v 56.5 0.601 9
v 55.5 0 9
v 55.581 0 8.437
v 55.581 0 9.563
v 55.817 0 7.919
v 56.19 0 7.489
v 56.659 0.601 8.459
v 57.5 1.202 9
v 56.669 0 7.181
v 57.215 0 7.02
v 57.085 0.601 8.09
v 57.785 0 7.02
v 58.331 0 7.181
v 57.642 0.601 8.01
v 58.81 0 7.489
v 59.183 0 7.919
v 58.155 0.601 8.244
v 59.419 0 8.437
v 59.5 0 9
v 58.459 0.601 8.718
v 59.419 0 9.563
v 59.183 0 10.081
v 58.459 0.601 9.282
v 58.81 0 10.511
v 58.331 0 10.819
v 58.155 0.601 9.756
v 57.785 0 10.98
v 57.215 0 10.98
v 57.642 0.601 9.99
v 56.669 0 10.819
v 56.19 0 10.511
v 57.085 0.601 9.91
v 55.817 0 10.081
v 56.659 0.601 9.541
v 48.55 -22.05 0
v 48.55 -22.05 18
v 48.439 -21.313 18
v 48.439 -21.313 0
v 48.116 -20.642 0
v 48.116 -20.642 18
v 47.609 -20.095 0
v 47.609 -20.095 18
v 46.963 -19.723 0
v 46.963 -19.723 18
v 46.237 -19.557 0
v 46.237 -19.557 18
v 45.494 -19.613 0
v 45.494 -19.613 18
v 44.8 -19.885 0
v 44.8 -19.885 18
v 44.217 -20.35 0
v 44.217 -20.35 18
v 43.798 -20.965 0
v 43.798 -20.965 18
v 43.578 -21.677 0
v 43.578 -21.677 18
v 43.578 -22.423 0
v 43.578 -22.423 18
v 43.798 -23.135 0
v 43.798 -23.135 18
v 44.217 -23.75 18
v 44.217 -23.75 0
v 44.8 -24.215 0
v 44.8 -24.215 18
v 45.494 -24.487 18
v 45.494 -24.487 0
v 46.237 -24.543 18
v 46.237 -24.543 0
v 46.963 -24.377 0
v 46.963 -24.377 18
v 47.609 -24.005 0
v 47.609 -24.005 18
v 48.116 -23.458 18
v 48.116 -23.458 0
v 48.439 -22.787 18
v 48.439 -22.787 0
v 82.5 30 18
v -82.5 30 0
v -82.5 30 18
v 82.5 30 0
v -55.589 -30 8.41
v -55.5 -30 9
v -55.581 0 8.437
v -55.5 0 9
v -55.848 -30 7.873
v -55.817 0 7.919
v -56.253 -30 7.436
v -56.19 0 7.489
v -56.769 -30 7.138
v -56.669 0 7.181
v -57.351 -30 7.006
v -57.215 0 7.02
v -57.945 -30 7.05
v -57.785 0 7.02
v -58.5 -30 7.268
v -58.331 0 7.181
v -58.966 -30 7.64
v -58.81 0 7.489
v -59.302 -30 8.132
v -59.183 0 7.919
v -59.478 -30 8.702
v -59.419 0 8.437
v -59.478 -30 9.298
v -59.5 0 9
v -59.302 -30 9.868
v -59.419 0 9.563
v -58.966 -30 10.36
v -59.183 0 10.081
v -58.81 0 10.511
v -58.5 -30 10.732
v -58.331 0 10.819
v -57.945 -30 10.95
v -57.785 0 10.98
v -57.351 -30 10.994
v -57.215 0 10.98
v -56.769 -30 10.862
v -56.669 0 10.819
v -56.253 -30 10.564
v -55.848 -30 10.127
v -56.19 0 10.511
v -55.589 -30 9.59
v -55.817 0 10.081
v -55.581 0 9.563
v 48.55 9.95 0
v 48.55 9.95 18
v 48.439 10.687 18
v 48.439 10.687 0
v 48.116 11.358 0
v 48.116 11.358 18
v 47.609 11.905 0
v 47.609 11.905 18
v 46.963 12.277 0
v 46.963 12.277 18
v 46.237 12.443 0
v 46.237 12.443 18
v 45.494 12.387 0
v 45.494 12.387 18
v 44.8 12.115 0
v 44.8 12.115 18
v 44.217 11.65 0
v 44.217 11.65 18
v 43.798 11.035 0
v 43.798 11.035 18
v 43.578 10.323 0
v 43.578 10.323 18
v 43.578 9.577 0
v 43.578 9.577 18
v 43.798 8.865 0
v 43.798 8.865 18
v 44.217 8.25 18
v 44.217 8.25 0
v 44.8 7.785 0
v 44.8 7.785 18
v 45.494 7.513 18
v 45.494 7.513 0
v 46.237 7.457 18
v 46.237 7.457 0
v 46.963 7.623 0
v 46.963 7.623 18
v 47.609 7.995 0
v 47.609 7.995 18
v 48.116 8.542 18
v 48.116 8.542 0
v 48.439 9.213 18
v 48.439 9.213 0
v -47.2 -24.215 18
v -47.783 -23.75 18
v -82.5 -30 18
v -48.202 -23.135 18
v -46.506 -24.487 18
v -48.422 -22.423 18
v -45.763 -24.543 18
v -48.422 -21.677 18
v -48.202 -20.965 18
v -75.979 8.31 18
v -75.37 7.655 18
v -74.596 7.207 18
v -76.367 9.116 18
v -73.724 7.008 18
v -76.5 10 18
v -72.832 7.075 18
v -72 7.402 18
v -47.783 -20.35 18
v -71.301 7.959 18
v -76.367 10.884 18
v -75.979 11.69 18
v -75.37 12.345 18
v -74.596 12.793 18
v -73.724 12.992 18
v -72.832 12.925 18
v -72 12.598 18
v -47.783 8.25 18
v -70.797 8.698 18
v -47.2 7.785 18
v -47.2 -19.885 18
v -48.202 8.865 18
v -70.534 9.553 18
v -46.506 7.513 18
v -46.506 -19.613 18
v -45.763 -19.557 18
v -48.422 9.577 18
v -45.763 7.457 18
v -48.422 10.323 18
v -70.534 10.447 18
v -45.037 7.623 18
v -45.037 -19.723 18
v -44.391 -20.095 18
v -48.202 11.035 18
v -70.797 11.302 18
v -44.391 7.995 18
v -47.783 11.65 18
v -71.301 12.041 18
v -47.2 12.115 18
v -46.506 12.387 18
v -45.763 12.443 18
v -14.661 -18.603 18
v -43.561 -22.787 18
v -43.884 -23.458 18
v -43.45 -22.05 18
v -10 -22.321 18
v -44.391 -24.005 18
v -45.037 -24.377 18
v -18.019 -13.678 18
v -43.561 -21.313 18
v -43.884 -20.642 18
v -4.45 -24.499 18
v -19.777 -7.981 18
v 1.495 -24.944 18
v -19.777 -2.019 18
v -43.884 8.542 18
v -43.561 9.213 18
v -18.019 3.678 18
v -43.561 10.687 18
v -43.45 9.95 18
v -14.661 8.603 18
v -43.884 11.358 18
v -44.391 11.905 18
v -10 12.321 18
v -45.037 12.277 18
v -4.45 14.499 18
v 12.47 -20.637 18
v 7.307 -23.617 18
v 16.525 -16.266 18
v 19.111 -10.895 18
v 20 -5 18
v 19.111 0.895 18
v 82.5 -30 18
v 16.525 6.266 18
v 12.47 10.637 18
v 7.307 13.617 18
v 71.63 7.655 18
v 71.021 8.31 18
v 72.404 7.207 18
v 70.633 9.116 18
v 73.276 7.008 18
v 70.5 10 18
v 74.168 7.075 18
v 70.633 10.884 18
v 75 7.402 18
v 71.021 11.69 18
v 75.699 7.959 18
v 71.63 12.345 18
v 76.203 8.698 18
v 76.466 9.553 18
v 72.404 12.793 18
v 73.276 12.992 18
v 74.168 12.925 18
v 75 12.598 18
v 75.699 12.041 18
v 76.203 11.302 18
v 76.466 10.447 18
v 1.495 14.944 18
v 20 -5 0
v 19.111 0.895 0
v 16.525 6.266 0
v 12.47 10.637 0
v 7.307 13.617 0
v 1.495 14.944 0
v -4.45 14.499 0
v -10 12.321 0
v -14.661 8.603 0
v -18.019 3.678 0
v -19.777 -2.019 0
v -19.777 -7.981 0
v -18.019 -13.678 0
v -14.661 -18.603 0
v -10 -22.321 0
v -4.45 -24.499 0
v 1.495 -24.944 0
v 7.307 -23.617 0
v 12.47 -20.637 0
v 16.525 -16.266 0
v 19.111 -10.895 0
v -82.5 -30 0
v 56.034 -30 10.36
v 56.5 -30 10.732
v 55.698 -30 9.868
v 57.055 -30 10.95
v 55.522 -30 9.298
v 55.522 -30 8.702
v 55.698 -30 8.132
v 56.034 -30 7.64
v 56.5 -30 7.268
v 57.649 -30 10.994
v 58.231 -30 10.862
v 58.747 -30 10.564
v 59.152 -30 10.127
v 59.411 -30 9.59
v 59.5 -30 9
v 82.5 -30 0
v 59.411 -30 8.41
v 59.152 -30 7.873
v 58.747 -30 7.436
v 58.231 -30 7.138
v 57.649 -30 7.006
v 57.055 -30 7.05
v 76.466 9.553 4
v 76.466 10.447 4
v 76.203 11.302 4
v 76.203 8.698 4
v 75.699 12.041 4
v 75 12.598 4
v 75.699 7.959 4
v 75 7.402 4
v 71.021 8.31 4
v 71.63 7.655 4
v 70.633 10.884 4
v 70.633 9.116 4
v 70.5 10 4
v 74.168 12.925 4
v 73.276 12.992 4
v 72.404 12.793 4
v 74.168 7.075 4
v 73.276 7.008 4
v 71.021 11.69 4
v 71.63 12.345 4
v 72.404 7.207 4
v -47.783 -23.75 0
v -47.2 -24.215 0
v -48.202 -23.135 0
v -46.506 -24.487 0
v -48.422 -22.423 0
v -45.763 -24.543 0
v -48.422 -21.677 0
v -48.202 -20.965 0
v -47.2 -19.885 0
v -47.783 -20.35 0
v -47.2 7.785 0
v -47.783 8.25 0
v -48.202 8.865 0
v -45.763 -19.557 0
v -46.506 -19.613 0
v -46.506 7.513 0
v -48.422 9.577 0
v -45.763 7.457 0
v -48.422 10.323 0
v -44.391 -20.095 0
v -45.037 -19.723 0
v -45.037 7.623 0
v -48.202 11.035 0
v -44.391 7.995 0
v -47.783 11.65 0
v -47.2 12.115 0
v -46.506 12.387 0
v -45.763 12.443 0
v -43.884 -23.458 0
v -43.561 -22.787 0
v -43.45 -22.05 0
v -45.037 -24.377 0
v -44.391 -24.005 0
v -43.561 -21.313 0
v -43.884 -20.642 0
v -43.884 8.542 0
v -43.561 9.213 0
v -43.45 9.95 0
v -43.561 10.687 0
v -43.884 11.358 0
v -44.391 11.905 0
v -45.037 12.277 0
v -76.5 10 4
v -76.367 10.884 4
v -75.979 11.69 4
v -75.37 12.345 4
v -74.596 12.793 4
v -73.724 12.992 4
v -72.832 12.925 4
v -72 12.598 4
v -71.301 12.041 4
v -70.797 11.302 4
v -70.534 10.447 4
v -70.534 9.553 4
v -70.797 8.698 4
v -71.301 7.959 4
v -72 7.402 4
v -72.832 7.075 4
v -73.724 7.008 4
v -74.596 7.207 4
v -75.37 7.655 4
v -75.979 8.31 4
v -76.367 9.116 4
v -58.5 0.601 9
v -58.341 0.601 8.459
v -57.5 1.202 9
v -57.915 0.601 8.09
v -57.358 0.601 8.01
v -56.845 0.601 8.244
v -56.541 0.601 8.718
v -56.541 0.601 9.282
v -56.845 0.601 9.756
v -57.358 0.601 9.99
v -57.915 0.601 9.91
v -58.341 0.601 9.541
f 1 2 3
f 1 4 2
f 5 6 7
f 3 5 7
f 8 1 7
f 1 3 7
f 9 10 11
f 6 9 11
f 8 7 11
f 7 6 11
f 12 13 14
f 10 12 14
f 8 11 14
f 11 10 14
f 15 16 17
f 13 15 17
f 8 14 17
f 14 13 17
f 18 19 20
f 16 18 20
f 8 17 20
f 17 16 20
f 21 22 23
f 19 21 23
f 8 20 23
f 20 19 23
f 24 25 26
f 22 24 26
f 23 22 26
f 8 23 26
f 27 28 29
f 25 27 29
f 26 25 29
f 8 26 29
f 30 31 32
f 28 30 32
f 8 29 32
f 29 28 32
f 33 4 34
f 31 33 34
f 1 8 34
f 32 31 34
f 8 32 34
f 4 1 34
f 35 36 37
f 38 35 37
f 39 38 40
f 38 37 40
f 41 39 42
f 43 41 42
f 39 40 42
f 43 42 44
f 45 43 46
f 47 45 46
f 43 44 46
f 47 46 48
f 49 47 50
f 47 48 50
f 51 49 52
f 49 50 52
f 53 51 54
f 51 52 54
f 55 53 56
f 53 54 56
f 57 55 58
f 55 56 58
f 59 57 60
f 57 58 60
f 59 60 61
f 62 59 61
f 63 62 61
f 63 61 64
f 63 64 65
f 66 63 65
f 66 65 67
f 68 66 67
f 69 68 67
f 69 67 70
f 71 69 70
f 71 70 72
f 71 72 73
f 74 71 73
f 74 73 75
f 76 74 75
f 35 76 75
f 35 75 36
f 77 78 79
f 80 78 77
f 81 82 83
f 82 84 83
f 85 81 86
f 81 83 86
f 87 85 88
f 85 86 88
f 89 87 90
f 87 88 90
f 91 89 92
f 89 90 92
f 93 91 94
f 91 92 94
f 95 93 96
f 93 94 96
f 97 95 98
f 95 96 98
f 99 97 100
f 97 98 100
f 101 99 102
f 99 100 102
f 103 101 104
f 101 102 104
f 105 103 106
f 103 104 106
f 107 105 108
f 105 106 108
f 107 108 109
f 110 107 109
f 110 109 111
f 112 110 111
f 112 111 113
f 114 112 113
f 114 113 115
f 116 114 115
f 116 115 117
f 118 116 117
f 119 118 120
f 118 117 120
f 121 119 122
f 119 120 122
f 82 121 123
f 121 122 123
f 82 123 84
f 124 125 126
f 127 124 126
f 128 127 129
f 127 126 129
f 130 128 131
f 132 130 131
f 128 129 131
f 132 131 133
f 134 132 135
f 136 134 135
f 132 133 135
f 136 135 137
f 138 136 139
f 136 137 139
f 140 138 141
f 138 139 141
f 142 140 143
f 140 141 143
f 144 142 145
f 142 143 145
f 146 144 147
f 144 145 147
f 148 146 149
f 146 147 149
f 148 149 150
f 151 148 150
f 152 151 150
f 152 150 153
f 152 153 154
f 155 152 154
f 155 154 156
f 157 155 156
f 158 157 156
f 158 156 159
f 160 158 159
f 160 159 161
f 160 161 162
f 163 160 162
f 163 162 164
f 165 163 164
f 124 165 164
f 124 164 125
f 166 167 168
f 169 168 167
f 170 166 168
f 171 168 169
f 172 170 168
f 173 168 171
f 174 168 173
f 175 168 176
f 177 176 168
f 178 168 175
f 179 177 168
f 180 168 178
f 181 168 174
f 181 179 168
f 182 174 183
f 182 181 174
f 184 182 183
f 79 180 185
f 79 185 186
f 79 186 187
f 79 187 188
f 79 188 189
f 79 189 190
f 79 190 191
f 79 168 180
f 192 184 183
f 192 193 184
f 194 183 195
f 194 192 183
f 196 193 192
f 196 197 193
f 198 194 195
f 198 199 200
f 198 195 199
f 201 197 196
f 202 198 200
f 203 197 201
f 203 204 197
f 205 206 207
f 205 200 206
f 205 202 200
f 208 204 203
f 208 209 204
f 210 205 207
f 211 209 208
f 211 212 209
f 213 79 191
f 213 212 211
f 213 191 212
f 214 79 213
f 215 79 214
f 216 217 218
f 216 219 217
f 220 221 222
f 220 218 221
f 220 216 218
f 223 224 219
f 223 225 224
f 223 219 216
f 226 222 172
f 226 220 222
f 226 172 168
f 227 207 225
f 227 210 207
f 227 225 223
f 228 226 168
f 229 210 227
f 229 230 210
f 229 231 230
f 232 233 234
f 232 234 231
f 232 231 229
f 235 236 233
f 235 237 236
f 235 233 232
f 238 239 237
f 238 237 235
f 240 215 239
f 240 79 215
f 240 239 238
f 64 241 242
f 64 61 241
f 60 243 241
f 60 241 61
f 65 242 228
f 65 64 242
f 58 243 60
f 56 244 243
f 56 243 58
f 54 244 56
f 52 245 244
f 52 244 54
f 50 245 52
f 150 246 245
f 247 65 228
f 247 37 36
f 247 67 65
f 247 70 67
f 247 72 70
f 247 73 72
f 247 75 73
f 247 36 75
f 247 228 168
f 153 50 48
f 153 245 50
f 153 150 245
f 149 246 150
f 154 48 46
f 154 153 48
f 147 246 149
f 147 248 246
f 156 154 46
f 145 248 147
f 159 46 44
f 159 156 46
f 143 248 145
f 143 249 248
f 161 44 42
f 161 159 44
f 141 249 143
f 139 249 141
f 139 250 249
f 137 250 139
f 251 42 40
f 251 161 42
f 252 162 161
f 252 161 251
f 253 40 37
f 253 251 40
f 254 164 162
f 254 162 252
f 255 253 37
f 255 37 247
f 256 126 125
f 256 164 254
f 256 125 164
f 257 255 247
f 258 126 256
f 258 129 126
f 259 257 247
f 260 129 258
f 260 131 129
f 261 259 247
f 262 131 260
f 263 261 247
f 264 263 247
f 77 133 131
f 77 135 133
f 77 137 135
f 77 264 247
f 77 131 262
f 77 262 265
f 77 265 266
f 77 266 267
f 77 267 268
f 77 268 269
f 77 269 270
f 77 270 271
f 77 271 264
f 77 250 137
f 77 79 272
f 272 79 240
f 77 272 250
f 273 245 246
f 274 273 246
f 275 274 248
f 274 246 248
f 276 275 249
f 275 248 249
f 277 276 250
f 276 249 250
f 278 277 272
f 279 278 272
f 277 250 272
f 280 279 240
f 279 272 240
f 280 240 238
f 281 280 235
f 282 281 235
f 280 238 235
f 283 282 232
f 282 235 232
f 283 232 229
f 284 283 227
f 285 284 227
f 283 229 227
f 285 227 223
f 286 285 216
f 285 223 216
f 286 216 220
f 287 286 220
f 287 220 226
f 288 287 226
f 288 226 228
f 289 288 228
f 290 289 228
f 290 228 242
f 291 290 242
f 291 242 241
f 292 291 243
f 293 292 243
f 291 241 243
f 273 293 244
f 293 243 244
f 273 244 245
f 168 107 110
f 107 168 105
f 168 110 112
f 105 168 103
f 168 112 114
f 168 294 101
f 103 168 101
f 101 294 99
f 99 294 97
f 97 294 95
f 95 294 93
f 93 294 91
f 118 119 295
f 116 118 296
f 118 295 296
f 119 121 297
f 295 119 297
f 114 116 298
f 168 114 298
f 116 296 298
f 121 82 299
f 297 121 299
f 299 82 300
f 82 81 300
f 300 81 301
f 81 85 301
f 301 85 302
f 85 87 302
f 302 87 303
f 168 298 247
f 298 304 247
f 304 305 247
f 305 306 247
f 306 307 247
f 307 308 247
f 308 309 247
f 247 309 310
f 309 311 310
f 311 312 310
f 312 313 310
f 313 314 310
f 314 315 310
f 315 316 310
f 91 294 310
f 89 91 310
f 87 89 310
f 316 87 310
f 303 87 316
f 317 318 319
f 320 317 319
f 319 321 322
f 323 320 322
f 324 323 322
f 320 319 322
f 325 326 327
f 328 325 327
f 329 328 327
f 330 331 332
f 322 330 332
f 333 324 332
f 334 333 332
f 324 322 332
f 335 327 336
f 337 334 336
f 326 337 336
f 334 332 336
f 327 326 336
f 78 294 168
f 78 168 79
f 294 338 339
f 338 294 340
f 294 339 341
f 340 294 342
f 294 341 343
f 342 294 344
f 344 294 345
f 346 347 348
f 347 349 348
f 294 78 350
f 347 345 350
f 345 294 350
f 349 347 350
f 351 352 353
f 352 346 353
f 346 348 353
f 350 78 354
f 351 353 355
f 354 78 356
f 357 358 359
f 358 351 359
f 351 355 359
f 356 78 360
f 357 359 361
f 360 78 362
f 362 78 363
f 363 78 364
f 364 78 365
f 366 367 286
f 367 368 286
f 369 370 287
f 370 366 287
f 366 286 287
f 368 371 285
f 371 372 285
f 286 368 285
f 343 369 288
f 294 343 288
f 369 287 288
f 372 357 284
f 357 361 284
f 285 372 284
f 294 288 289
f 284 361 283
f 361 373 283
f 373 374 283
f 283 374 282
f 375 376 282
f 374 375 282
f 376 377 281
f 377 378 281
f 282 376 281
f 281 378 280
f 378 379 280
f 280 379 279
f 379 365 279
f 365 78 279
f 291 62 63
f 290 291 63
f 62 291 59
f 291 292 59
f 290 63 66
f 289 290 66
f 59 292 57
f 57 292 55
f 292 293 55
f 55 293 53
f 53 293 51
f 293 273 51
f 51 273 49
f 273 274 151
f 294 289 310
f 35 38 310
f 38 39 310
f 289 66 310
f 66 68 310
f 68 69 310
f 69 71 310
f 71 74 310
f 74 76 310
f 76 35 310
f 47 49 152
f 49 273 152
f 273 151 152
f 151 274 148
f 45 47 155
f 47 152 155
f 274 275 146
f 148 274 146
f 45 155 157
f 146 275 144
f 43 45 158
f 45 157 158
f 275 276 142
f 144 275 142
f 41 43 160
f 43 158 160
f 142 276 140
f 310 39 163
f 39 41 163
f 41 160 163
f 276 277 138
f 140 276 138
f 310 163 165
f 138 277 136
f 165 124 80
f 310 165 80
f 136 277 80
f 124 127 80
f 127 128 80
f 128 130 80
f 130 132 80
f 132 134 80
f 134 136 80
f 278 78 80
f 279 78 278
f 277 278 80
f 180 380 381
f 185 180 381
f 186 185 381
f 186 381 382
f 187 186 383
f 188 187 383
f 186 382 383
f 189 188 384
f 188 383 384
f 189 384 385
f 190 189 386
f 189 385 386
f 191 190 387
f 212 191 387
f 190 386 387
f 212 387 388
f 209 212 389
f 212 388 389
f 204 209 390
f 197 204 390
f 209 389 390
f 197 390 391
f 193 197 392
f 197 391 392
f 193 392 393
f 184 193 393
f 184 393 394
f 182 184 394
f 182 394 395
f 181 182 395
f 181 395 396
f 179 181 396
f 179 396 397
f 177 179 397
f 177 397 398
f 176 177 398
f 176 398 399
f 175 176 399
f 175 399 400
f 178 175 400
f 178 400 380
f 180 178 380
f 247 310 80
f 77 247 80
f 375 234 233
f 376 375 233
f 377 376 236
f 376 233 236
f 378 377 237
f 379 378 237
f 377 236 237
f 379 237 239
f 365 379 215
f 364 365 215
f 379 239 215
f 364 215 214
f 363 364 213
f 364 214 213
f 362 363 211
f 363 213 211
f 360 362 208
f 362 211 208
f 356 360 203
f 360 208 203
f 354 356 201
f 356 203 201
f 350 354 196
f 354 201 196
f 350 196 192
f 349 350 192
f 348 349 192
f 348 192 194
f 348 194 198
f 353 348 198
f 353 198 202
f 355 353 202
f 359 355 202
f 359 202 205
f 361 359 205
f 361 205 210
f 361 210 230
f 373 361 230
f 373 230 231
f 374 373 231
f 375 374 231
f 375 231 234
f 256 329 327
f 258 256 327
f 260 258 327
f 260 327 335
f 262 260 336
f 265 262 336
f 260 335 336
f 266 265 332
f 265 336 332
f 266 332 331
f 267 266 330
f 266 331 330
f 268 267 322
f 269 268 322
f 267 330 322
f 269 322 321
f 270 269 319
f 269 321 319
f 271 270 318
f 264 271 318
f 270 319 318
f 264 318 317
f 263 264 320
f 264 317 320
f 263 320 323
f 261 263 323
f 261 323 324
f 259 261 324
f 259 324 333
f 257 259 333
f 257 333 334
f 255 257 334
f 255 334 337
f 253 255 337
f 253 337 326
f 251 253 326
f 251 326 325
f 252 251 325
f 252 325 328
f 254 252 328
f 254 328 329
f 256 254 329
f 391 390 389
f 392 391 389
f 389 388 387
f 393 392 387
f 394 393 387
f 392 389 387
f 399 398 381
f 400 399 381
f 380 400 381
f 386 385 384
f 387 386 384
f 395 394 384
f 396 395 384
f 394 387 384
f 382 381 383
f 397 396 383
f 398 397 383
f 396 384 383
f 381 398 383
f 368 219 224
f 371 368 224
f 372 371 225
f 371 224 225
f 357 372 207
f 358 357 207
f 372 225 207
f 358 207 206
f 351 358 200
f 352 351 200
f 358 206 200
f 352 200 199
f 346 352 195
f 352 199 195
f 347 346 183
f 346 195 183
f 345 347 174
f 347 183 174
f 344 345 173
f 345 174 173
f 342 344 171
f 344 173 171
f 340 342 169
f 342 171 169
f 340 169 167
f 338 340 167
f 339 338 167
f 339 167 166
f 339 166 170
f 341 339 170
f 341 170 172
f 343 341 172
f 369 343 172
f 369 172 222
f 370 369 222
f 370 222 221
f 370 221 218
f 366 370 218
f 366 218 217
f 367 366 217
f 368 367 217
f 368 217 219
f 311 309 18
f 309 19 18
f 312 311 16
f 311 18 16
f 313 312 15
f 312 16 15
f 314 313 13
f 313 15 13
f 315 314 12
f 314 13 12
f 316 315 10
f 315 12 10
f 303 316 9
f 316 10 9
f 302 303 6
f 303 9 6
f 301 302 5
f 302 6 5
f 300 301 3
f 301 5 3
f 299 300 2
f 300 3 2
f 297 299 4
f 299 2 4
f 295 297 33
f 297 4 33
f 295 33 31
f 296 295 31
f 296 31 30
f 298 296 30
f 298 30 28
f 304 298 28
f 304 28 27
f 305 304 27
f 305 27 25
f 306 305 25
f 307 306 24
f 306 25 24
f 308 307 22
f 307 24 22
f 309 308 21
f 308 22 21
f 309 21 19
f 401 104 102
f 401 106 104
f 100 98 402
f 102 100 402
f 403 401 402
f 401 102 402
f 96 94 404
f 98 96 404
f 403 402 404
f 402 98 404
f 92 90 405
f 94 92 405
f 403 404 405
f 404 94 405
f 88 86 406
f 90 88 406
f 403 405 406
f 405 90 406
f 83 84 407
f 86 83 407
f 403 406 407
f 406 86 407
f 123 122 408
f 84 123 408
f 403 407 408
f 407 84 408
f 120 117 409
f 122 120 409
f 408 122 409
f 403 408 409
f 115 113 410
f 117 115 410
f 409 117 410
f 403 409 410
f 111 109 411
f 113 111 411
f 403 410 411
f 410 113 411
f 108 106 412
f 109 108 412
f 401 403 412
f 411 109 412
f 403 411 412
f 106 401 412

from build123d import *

# Parameters (mm, degrees)
SKETCH1_W                    = 165
SKETCH1_H                    = 60
BOSS_EXTRUDE1_DEPTH          = 18
SKETCH3_R                    = 20
CUT_EXTRUDE2_DEPTH           = 18
F_4_0_4_DIAMETER_HOLE1_D     = 4
F_4_0_4_DIAMETER_HOLE1_DEPTH = 30
F_4_0_4_DIAMETER_HOLE1_TIP   = 1.201721238
F_6_0_6_DIAMETER_HOLE2_D     = 6
F_6_0_6_DIAMETER_HOLE2_DEPTH = 14
F_5_0_5_DIAMETER_HOLE1_D     = 5


with BuildPart() as part:
    # Sketch1 → Boss-Extrude1 (new body)
    with BuildSketch(Plane.XY):
        Rectangle(SKETCH1_W, SKETCH1_H)
    extrude(amount=BOSS_EXTRUDE1_DEPTH)

    # Sketch3 → Cut-Extrude2 (cut)
    with BuildSketch(Plane.XY.offset(18)):
        with Locations((0, -5)):
            Circle(SKETCH3_R)
    extrude(amount=-CUT_EXTRUDE2_DEPTH, mode=Mode.SUBTRACT)

    # Ø4.0 (4) Diameter Hole1
    with Locations(Plane(origin=(0, -30, 0), x_dir=(-1, 0, 0), z_dir=(0, -1, 0))):
        with Locations((57.5, -9), (-57.5, -9)):
            Hole(F_4_0_4_DIAMETER_HOLE1_D / 2, depth=F_4_0_4_DIAMETER_HOLE1_DEPTH)
            with Locations((0, 0, -(F_4_0_4_DIAMETER_HOLE1_DEPTH + F_4_0_4_DIAMETER_HOLE1_TIP / 2))):  # 118° drill point
                Cone(0, F_4_0_4_DIAMETER_HOLE1_D / 2, F_4_0_4_DIAMETER_HOLE1_TIP, mode=Mode.SUBTRACT)

    # Ø6.0 (6) Diameter Hole2
    with Locations(Plane.XY.offset(18)):
        with Locations((73.5, 10), (-73.5, 10)):
            Hole(F_6_0_6_DIAMETER_HOLE2_D / 2, depth=F_6_0_6_DIAMETER_HOLE2_DEPTH)

    # Ø5.0 (5) Diameter Hole1 (through all)
    with Locations(Plane(origin=(0, 0, 0), x_dir=(-1, 0, 0), z_dir=(0, 0, -1))):
        with Locations((-46.05, 9.95), (-46.05, -22.05), (45.95, 9.95), (45.95, -22.05)):
            Hole(F_5_0_5_DIAMETER_HOLE1_D / 2)


solid = part.part
